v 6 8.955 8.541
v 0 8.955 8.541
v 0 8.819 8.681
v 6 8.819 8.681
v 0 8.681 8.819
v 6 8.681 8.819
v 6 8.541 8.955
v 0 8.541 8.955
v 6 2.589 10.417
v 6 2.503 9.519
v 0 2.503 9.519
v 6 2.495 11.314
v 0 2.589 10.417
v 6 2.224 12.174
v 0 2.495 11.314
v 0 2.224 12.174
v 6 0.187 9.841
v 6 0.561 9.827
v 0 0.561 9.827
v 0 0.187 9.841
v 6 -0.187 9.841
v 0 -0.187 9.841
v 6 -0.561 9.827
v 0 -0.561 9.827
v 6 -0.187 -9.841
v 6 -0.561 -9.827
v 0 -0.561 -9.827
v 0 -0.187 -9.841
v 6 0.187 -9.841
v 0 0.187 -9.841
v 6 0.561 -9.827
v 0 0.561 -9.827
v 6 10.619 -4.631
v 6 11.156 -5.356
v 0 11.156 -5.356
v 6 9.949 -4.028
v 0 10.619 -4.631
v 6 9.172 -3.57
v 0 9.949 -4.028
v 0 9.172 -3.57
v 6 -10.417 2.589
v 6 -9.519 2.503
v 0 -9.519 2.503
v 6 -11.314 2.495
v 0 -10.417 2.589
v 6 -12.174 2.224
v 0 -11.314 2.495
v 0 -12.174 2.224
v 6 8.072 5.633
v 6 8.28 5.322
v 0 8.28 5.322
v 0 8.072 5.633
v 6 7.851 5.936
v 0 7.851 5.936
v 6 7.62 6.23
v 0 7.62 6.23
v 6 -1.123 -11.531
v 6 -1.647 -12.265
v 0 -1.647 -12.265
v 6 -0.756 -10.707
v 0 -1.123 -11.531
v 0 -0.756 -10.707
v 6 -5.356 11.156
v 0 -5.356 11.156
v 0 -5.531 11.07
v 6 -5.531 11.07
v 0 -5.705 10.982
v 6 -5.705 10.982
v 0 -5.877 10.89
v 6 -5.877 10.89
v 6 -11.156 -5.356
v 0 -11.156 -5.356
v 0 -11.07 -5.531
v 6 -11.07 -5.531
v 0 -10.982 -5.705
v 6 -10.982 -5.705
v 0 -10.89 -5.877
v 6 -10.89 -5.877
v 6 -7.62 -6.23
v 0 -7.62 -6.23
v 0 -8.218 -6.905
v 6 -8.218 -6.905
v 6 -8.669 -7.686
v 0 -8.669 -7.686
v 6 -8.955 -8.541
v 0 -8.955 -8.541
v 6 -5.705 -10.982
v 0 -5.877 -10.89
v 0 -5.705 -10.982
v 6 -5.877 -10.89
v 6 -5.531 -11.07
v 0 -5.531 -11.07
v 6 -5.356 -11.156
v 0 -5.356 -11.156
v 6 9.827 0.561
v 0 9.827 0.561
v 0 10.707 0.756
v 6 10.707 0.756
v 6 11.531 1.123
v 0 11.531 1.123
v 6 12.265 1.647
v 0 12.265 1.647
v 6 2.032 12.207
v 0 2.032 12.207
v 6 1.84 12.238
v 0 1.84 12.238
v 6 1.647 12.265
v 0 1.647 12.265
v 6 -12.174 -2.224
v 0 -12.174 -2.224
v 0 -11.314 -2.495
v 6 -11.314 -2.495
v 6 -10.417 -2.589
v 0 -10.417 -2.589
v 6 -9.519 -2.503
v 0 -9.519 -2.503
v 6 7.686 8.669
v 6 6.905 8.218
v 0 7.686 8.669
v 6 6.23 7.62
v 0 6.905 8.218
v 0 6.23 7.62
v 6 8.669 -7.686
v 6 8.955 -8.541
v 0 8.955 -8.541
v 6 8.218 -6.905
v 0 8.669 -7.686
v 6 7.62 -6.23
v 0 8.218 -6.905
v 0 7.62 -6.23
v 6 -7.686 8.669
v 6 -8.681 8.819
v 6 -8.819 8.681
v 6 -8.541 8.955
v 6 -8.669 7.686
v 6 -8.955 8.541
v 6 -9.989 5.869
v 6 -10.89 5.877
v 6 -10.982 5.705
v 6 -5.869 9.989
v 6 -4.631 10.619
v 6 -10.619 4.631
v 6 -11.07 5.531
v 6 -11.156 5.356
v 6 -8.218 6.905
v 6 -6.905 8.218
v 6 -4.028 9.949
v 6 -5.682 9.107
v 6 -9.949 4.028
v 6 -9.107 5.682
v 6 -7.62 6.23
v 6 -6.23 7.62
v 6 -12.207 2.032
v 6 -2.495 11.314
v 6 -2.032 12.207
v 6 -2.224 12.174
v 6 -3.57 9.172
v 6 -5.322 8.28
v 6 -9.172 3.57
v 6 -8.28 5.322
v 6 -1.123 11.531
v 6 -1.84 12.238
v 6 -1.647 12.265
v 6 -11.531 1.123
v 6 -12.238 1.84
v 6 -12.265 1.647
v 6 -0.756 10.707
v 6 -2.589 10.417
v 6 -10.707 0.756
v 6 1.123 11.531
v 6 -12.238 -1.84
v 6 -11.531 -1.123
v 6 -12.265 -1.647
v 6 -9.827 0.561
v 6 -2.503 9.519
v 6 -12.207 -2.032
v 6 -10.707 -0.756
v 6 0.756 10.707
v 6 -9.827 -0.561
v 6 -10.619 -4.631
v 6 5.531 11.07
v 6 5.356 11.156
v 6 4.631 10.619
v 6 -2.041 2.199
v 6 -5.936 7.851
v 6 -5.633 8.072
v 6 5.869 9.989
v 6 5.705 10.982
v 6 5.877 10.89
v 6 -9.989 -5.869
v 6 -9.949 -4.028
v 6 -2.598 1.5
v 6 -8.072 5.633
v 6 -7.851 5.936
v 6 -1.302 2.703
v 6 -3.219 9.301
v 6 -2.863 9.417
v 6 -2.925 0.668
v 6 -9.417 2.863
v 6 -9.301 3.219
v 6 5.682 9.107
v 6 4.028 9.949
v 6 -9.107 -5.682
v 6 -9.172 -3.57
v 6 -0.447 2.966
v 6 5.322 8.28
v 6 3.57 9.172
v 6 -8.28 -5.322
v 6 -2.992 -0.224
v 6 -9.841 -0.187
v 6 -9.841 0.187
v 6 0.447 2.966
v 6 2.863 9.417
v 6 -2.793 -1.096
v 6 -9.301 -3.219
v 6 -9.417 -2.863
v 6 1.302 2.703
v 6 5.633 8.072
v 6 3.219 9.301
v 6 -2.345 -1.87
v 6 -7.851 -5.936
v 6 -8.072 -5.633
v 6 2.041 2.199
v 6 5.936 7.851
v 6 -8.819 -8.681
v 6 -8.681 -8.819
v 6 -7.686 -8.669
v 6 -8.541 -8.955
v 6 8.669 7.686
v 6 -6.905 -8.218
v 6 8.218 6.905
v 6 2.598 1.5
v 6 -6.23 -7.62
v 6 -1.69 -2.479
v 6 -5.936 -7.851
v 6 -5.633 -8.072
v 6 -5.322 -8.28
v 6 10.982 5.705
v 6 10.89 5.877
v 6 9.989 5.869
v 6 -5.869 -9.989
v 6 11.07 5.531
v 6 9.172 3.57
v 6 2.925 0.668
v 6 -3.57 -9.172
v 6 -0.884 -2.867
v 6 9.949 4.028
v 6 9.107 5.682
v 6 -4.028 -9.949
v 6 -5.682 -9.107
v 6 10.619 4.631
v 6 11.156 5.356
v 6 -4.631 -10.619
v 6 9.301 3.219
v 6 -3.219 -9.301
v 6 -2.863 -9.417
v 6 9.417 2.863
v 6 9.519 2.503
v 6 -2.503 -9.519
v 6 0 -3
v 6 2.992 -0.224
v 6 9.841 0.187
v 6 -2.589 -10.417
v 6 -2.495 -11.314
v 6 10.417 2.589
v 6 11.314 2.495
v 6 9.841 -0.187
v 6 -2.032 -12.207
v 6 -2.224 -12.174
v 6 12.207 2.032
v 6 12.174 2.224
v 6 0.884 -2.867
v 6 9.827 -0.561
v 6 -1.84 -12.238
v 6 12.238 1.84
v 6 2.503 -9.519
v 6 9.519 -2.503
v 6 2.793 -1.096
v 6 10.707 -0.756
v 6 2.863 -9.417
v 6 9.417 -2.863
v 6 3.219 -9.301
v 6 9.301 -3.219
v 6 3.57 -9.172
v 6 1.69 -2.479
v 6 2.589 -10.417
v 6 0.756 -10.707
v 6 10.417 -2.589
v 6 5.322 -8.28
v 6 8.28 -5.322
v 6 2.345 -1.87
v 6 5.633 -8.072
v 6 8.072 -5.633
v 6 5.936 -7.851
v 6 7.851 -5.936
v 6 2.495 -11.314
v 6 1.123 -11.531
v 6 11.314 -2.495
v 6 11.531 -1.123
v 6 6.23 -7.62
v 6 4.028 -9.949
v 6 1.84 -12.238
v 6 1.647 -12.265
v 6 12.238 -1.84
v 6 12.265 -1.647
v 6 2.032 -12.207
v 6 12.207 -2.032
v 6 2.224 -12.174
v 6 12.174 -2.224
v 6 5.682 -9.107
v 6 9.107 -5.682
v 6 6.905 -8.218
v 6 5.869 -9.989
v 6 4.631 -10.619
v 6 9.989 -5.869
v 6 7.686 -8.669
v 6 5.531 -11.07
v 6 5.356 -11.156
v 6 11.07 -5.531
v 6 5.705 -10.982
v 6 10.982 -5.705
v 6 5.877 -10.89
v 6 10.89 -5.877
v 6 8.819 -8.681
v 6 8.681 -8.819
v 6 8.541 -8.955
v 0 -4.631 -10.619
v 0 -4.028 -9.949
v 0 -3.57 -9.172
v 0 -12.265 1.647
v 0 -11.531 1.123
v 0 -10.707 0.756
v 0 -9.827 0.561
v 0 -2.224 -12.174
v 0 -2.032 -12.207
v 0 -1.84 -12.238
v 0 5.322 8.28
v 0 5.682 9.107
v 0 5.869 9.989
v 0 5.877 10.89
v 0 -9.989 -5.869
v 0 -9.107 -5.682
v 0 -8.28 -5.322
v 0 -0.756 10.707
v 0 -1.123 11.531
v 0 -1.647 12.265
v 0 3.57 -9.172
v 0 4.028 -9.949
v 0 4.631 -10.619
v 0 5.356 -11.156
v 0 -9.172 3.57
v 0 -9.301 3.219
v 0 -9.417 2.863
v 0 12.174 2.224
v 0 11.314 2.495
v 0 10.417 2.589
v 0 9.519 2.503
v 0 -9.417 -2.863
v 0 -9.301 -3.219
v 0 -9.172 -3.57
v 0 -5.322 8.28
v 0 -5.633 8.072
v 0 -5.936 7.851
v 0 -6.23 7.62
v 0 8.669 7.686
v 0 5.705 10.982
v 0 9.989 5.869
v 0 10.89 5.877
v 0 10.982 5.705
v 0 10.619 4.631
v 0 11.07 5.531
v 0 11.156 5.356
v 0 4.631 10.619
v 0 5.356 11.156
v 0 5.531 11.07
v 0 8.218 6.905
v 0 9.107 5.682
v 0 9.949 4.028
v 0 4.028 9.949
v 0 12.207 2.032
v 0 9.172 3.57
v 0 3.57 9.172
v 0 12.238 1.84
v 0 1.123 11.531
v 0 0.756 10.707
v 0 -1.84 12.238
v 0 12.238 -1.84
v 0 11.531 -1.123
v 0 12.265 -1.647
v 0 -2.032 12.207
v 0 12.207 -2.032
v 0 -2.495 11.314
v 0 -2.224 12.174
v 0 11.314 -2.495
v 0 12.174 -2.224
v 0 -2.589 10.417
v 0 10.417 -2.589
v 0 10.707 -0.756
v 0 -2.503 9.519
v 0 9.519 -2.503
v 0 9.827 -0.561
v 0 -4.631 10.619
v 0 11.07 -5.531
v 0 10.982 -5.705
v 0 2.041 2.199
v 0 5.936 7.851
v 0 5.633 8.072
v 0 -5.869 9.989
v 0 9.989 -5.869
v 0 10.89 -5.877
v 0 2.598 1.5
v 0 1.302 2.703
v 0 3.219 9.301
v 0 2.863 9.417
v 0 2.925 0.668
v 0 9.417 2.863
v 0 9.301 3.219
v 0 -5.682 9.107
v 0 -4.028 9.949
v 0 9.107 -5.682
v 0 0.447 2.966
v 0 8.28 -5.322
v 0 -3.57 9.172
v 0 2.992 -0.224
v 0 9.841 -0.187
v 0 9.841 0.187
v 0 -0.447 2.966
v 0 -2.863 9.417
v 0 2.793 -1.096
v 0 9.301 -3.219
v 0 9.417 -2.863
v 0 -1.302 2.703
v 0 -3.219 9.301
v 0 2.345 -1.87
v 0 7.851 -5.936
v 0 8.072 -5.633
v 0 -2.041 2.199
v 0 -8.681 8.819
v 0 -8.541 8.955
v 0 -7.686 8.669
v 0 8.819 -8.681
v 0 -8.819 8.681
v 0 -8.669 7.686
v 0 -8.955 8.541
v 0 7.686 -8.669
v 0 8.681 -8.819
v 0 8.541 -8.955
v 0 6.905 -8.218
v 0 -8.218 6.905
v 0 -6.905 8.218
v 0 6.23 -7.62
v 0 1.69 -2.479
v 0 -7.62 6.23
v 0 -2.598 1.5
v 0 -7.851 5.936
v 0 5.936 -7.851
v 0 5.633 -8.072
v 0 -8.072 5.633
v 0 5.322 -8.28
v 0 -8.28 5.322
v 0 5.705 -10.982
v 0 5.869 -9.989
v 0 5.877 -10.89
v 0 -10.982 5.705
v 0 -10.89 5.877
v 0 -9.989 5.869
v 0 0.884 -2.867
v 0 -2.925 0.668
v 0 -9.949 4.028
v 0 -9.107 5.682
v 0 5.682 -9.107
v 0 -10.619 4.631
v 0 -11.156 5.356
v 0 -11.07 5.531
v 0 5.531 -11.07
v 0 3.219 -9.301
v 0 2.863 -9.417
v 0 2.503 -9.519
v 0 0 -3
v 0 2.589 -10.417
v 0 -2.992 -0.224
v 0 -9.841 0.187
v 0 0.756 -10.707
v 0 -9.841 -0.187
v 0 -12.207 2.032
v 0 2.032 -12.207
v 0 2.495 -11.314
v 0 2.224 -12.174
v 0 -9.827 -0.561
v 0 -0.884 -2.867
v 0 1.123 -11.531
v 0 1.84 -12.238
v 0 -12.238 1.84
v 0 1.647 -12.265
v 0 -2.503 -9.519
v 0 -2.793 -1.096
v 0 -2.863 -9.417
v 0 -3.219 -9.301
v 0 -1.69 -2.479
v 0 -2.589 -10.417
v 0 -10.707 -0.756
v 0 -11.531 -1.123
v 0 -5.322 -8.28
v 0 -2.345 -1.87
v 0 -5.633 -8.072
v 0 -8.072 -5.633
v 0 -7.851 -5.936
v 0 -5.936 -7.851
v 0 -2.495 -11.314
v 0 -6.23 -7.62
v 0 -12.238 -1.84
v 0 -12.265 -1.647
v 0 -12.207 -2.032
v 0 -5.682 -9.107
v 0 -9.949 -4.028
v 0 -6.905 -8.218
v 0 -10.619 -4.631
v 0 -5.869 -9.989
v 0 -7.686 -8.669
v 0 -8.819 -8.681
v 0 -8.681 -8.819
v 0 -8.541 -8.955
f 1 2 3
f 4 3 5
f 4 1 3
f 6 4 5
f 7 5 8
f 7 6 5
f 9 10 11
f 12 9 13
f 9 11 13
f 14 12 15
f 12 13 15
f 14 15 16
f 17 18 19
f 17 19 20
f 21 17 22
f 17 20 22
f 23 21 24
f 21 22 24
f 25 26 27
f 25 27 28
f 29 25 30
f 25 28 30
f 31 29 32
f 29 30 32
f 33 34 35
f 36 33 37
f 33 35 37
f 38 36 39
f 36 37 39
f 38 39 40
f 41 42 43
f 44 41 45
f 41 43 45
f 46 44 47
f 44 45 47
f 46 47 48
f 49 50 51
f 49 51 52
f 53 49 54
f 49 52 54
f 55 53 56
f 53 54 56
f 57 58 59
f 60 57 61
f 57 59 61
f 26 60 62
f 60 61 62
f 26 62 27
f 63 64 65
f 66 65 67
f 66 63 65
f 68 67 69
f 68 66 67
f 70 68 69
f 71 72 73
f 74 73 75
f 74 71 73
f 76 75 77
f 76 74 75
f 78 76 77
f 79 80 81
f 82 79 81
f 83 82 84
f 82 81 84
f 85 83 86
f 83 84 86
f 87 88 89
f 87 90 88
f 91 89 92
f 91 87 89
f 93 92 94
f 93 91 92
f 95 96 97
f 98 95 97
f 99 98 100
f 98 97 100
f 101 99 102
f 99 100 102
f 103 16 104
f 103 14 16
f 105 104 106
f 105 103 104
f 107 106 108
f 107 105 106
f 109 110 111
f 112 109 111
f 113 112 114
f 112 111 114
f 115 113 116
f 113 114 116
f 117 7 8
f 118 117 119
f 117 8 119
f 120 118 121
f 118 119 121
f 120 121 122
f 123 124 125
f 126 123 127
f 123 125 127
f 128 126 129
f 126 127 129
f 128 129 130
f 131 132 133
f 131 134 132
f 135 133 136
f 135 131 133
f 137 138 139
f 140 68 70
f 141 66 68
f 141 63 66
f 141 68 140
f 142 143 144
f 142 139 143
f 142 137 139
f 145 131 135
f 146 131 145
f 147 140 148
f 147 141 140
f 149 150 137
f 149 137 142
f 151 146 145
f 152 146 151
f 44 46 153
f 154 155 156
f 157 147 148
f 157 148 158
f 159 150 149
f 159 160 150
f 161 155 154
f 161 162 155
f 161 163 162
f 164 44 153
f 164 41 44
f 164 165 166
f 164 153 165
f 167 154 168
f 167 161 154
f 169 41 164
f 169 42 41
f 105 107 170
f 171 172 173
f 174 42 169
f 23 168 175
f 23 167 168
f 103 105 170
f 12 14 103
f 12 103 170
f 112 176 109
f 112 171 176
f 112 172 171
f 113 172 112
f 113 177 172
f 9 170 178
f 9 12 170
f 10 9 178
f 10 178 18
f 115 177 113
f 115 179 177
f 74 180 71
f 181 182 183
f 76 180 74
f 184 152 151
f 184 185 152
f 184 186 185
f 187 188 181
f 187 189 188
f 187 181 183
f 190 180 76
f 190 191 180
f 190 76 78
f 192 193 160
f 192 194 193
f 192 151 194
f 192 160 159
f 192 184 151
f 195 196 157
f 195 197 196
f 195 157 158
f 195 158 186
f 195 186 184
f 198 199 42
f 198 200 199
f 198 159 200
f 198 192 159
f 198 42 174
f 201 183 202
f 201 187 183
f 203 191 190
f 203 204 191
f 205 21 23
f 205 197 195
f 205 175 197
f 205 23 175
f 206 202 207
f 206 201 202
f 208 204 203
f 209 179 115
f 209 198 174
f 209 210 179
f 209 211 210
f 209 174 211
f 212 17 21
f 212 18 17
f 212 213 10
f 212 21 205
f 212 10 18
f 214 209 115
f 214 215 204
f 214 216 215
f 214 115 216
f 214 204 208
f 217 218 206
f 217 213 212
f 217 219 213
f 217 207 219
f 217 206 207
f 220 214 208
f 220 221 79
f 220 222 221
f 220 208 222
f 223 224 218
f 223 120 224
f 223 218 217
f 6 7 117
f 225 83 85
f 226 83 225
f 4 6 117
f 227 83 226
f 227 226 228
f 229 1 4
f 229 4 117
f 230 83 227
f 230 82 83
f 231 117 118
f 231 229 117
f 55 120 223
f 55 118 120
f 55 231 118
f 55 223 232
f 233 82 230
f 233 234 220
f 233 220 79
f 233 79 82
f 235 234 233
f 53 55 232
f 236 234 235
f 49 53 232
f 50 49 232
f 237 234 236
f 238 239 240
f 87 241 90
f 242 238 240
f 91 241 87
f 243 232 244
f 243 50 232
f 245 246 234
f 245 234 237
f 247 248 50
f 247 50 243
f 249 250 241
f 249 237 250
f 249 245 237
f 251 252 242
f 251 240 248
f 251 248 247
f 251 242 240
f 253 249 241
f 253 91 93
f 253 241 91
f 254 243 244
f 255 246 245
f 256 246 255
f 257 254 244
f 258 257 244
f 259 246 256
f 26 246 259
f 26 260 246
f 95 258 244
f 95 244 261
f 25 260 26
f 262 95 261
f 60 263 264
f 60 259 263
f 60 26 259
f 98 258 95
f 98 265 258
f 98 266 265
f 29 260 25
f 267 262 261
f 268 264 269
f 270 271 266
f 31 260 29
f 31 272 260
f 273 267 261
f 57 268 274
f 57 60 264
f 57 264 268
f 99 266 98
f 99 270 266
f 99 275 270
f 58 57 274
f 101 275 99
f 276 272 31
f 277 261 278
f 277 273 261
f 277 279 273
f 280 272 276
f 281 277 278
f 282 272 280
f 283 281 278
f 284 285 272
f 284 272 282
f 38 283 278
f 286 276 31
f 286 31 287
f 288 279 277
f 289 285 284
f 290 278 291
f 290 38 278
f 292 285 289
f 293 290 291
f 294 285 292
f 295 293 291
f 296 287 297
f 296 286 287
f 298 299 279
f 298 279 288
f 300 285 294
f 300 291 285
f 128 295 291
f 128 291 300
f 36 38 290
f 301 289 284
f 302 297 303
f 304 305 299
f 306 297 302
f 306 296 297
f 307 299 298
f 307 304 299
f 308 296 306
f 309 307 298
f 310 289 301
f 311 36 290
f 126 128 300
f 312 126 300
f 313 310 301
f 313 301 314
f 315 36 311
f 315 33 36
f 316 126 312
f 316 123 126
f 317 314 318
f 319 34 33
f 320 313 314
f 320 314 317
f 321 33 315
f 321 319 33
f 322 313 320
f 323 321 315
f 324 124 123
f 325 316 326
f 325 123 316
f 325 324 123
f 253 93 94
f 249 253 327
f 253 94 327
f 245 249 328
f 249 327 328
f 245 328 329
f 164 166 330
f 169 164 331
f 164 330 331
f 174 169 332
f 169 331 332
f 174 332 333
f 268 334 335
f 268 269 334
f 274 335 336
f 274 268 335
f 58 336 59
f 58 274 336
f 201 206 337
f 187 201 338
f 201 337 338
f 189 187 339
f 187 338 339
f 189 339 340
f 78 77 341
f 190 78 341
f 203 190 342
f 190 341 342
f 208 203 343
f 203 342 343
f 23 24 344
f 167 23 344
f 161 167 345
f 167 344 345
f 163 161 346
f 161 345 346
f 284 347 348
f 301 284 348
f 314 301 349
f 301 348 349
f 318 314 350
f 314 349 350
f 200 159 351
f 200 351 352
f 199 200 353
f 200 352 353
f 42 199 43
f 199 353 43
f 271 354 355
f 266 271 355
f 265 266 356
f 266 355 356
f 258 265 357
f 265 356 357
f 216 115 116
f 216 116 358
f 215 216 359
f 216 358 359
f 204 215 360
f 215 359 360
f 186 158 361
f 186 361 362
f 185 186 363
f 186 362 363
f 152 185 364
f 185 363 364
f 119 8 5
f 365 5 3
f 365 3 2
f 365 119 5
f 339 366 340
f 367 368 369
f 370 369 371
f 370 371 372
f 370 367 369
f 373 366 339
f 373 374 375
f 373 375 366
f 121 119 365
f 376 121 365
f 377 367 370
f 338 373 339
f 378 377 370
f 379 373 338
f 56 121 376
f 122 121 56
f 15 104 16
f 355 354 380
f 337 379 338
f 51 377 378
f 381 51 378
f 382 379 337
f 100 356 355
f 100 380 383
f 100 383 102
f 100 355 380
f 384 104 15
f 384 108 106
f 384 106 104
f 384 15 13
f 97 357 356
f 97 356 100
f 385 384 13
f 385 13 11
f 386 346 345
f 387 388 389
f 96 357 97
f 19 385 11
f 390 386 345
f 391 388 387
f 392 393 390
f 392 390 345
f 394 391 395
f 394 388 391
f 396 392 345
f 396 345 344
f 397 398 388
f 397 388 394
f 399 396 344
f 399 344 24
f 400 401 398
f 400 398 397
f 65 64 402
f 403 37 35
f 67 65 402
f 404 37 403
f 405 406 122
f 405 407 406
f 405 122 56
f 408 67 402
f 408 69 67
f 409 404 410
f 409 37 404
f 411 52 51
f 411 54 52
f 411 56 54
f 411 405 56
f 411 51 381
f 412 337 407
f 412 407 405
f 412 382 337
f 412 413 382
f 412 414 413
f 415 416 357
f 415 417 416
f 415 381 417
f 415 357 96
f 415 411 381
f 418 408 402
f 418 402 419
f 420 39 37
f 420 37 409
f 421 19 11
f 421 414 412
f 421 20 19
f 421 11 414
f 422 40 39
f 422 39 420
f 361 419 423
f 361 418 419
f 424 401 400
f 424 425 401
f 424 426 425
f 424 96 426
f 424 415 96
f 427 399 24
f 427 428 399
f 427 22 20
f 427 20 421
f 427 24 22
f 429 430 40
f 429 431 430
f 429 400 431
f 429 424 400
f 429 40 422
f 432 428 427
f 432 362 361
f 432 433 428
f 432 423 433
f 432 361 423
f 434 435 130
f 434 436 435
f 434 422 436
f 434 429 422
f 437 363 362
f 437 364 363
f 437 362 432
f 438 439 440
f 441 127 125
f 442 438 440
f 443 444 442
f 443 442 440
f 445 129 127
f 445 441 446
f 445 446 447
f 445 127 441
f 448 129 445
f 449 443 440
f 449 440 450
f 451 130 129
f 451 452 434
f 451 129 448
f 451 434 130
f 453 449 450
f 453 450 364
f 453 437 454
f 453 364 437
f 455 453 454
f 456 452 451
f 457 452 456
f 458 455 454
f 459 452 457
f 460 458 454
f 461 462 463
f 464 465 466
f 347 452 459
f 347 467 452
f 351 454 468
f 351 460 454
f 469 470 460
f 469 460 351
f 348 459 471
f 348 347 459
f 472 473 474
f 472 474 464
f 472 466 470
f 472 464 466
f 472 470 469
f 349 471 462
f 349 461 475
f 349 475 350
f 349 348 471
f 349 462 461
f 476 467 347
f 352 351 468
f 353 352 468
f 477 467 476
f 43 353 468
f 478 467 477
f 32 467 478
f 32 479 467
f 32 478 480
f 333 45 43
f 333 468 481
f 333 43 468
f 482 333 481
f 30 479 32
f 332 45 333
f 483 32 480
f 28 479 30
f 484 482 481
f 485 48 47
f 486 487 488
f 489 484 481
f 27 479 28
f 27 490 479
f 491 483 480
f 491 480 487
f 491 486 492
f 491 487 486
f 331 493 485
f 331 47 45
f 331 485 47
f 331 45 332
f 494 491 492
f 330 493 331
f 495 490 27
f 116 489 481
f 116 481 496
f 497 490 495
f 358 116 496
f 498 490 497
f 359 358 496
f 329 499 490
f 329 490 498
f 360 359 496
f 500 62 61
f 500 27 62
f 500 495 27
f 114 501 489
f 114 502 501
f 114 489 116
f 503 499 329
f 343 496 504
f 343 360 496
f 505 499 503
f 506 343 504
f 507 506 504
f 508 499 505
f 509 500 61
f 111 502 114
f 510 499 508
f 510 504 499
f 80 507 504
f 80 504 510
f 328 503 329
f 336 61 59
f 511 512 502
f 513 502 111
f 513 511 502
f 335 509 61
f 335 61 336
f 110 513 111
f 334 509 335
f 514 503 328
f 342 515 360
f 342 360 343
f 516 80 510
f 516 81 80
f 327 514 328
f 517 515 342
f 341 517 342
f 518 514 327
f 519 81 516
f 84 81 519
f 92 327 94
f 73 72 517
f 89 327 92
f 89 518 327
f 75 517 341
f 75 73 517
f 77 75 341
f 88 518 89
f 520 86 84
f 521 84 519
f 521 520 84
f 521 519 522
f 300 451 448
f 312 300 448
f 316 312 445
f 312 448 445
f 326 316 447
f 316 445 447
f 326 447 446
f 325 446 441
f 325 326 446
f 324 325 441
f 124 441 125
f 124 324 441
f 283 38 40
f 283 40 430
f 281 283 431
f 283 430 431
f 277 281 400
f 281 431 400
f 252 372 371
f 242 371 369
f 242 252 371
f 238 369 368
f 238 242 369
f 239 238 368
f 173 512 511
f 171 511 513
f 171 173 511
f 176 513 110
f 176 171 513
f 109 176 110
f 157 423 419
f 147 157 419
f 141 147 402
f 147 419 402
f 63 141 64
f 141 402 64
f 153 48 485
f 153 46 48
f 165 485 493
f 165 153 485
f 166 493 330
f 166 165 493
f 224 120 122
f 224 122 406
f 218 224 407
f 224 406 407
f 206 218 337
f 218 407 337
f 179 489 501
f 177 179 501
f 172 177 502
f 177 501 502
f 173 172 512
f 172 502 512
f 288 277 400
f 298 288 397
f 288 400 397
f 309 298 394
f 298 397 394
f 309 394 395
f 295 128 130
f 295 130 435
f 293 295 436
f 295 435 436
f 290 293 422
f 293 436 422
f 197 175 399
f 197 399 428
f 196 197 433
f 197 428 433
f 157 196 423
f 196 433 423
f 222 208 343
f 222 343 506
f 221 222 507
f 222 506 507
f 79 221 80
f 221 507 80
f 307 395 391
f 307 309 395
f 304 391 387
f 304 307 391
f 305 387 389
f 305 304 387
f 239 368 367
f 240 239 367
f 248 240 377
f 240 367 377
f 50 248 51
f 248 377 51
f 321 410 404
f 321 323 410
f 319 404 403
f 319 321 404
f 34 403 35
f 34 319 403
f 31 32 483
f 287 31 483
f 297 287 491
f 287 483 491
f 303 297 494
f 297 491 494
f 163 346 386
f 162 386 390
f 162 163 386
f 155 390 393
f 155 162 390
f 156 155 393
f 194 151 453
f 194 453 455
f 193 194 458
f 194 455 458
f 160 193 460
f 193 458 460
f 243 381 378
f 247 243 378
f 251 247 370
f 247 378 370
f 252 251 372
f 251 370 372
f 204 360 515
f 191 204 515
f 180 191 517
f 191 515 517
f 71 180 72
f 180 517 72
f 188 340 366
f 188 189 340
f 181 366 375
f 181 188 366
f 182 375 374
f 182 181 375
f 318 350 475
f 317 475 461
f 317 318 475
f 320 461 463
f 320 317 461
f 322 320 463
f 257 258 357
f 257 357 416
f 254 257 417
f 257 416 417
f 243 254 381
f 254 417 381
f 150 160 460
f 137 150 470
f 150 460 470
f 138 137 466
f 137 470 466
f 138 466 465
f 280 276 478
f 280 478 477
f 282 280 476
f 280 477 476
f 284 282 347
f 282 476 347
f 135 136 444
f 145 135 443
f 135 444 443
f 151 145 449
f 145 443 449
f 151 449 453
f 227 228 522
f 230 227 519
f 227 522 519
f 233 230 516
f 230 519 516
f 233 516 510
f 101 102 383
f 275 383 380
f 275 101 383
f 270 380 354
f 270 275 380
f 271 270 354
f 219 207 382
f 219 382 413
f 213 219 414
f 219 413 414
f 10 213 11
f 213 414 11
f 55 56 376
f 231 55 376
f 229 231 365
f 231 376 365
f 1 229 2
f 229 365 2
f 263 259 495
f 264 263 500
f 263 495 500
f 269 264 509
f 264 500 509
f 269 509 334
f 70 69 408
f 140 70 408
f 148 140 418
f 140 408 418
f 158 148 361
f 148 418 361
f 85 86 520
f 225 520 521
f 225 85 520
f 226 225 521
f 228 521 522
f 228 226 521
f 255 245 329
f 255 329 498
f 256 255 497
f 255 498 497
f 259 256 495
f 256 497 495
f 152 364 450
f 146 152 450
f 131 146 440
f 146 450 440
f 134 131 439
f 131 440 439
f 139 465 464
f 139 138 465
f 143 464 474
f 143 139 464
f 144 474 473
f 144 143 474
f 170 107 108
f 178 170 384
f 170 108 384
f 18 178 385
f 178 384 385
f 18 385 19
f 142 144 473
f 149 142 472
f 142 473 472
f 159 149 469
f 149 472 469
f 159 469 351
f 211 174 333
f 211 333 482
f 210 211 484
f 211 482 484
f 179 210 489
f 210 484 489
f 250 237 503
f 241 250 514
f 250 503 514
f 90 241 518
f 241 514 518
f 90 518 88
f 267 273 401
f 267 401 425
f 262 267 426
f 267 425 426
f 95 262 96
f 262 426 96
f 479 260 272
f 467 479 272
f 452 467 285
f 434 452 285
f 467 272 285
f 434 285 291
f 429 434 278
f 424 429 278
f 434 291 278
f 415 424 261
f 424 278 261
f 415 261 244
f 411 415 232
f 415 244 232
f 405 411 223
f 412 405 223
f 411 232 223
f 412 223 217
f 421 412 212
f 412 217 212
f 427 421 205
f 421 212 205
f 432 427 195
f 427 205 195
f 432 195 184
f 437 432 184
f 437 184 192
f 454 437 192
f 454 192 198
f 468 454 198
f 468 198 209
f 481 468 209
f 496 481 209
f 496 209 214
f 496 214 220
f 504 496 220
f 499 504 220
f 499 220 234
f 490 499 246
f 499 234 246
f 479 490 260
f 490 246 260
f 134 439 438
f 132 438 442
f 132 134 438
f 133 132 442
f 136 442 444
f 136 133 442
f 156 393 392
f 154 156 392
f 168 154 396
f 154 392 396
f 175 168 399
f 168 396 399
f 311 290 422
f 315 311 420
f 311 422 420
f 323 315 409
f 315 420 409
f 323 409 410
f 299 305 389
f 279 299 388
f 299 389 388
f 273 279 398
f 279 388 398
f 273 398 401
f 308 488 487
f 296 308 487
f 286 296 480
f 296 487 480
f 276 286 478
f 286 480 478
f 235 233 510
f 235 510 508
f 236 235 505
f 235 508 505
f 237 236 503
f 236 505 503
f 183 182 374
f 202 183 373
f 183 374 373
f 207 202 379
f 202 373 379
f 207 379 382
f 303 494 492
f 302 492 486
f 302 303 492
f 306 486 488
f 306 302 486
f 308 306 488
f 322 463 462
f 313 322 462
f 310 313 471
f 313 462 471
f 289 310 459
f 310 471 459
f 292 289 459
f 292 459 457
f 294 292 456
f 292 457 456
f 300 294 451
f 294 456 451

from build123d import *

# Parameters (mm, degrees)
BASPROSKE_W         = 6
BASPROSKE_H         = 12.375
TOOTHCUT_DEPTH      = 19.500844575
TEETHCUTS_COUNT     = 20
BORSKE_R            = 3
BORE_DEPTH          = 50.0000508
SKETCH1_R           = 3
BOSS_EXTRUDE1_DEPTH = 6
CUT_EXTRUDE1_DEPTH  = 6
SKETCH3_R           = 3
CUT_EXTRUDE2_DEPTH  = 6


with BuildPart() as part:
    # BasProSke → Base-Revolve (revolve)
    with BuildSketch(Plane(origin=(0, 0, 0), x_dir=(1, 0, 0), z_dir=(0, 1, 0)), mode=Mode.PRIVATE) as base_revolve_sk:
        with Locations((3, 6.1875)):
            Rectangle(BASPROSKE_W, BASPROSKE_H)
    revolve(base_revolve_sk.sketch.rotate(Axis((-10, 0, 0), (1, 0, 0)), 180), axis=Axis((-10, 0, 0), (1, 0, 0)))

    # TooCutSke → ToothCut (cut, through all)
    with BuildSketch(Plane(origin=(0, 0, 0), x_dir=(0, 0, -1), z_dir=(1, 0, 0))):
        with BuildLine():
            ThreePointArc((0.561279811, 9.826733564), (0, 9.84275), (-0.561279811, 9.826733564))
            ThreePointArc((-0.561279811, 9.826733564), (-0.925277854, 11.14210546), (-1.666860651, 12.287859689))
            ThreePointArc((-1.666860651, 12.287859689), (0, 12.4004), (1.666860651, 12.287859689))
            ThreePointArc((1.666860651, 12.287859689), (0.925277854, 11.14210546), (0.561279811, 9.826733564))
        make_face()
    toothcut = extrude(amount=TOOTHCUT_DEPTH, mode=Mode.SUBTRACT)

    # TeethCuts: ToothCut ×20 about axis
    teethcuts_axis = Axis((0, 0, 0), (1, 0, 0))
    for i in range(1, TEETHCUTS_COUNT):
        add(toothcut.rotate(teethcuts_axis, i * 360 / TEETHCUTS_COUNT), mode=Mode.SUBTRACT)

    # BorSke → Bore (cut, symmetric)
    with BuildSketch(Plane(origin=(0, 0, 0), x_dir=(0, 0, -1), z_dir=(1, 0, 0))):
        with Locations(Location((0, 0, 0), (0, 0, 180))):
            Circle(BORSKE_R)
    extrude(amount=BORE_DEPTH, both=True, mode=Mode.SUBTRACT)

    # Sketch1 → Boss-Extrude1 (add)
    with BuildSketch(Plane(origin=(6, 0, 0), x_dir=(0, 0, -1), z_dir=(1, 0, 0))):
        Circle(SKETCH1_R)
    extrude(amount=-BOSS_EXTRUDE1_DEPTH)

    # Sketch2 → Cut-Extrude1 (cut)
    with BuildSketch(Plane(origin=(6, 0, 0), x_dir=(0, 0, -1), z_dir=(1, 0, 0))):
        with BuildLine():
            ThreePointArc((1.8, 2.01246118), (0, 2.7), (-1.8, 2.01246118))
            Line((-1.8, 2.01246118), (-1.8, 0))
            Line((-1.8, 0), (1.8, 0))
            Line((1.8, 0), (1.8, 2.01246118))
        make_face()
        with BuildLine():
            Line((1.8, 0), (-1.8, 0))
            Line((-1.8, 0), (-1.8, -2.01246118))
            ThreePointArc((-1.8, -2.01246118), (0, -2.7), (1.8, -2.01246118))
            Line((1.8, -2.01246118), (1.8, 0))
        make_face()
    extrude(amount=-CUT_EXTRUDE1_DEPTH, mode=Mode.SUBTRACT)

    # Sketch3 → Cut-Extrude2 (cut)
    with BuildSketch(Plane(origin=(6, 0, 0), x_dir=(0, 0, -1), z_dir=(1, 0, 0))):
        Circle(SKETCH3_R)
    extrude(amount=-CUT_EXTRUDE2_DEPTH, mode=Mode.SUBTRACT)


solid = part.part
